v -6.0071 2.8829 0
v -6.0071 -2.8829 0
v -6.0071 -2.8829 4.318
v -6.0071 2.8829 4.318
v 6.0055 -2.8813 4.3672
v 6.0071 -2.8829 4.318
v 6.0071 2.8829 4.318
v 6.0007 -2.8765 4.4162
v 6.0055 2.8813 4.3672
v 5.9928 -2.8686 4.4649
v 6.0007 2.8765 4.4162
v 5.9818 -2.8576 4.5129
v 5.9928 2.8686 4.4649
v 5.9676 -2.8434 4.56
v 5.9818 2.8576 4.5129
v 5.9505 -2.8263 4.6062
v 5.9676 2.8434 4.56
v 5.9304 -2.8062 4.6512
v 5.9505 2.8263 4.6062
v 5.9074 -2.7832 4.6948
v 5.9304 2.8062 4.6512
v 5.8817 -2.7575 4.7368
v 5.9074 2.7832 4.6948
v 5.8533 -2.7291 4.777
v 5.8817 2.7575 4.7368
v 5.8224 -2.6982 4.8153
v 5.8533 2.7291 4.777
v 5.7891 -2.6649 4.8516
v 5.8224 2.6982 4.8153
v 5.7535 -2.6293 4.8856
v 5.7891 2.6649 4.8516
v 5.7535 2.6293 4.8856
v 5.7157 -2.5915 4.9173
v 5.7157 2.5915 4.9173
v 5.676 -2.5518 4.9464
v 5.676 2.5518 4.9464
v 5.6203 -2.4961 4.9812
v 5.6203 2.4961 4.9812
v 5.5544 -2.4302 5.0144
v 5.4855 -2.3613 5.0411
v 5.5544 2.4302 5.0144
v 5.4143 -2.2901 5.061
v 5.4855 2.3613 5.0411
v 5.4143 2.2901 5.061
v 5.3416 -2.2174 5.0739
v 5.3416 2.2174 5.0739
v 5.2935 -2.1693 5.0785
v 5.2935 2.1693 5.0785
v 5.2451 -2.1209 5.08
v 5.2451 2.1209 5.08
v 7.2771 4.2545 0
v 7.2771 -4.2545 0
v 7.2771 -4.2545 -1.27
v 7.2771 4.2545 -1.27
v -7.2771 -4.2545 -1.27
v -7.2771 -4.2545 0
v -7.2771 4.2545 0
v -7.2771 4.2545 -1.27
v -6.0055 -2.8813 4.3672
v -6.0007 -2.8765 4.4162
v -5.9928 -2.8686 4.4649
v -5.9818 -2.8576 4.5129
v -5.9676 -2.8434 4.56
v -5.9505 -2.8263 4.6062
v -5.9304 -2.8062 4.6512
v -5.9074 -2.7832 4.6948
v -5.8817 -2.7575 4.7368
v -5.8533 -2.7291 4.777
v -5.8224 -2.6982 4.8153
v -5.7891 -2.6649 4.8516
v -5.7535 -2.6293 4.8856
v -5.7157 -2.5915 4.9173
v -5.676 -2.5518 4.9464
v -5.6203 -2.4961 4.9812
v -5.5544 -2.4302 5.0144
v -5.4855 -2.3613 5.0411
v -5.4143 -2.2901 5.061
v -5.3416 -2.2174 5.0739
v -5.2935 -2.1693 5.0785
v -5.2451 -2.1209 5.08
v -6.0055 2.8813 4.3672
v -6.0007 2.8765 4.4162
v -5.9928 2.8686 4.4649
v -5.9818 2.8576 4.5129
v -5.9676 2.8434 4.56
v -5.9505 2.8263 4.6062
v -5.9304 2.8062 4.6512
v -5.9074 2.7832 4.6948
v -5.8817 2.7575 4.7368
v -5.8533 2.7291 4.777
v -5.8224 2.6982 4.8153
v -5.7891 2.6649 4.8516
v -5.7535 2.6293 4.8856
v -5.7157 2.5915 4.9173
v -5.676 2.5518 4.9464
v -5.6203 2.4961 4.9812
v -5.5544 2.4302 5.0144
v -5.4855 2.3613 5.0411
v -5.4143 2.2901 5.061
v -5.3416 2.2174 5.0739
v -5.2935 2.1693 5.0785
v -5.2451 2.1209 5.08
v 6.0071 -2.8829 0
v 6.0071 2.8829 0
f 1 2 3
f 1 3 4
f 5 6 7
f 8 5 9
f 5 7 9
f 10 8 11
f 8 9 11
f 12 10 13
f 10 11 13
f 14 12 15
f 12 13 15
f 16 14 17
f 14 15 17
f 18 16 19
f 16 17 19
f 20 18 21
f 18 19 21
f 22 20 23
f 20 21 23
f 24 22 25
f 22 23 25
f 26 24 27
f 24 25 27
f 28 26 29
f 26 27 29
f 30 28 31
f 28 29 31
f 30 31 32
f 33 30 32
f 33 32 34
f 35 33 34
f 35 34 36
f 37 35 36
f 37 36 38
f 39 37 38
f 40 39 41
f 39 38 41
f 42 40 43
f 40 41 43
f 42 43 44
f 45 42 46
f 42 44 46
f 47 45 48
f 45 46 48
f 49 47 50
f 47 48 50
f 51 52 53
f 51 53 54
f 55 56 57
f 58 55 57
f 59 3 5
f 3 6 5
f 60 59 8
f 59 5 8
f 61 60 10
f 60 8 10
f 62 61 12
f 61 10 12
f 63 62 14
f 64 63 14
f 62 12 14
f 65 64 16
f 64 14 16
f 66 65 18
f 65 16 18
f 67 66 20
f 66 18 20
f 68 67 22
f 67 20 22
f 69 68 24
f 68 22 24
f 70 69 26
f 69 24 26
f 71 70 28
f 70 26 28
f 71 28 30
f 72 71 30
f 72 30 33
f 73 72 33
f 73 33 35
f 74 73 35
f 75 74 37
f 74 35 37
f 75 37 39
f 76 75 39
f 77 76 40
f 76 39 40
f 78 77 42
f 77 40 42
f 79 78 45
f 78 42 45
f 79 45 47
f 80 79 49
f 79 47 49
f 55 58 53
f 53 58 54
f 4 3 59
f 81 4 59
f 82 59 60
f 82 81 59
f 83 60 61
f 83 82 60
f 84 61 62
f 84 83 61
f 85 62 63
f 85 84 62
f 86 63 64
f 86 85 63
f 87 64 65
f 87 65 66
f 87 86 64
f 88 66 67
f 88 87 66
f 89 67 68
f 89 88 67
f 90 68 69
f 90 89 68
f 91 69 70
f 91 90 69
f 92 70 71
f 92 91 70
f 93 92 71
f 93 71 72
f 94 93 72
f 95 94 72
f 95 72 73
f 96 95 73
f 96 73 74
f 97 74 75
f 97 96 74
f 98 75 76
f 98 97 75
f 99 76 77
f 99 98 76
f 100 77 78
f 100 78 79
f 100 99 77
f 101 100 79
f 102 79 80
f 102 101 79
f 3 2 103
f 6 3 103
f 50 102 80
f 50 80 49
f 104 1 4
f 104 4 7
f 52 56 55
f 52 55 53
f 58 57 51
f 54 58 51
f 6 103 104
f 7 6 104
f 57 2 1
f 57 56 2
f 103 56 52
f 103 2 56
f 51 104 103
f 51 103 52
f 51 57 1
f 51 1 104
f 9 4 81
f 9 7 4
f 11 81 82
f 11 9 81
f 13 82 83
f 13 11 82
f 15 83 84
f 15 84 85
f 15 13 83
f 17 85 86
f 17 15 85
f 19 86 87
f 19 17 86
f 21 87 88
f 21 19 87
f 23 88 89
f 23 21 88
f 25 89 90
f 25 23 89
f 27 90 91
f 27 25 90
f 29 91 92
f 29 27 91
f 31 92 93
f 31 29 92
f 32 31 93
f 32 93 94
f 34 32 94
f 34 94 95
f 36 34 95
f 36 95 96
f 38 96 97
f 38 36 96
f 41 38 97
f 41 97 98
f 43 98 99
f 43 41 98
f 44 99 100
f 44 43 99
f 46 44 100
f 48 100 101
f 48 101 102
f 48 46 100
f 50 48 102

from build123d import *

# Parameters (mm, degrees)
F0_W     = 12.0142
F0_H     = 5.7658
F1_DEPTH = 5.08
F2_W     = 14.5542
F2_H     = 8.509
F3_DEPTH = 1.27
F4_R     = 0.762


with BuildPart() as f1:
    # F0 (on Top) → F1 (new body)
    with BuildSketch(Plane.XY):
        Rectangle(F0_W, F0_H)
    extrude(amount=F1_DEPTH)

    # F2 (on Top) → F3 (join)
    with BuildSketch(Plane.XY):
        Rectangle(F2_W, F2_H)
    extrude(amount=-F3_DEPTH)

    # F4
    f4_edges = [f1.edges().sort_by_distance(p)[0] for p in [
        (6.0071, 0, 5.08),
        (0, 2.8829, 5.08),
        (-6.0071, 0, 5.08),
        (0, -2.8829, 5.08),
    ]]
    fillet(f4_edges, radius=F4_R)


solid = f1.part
